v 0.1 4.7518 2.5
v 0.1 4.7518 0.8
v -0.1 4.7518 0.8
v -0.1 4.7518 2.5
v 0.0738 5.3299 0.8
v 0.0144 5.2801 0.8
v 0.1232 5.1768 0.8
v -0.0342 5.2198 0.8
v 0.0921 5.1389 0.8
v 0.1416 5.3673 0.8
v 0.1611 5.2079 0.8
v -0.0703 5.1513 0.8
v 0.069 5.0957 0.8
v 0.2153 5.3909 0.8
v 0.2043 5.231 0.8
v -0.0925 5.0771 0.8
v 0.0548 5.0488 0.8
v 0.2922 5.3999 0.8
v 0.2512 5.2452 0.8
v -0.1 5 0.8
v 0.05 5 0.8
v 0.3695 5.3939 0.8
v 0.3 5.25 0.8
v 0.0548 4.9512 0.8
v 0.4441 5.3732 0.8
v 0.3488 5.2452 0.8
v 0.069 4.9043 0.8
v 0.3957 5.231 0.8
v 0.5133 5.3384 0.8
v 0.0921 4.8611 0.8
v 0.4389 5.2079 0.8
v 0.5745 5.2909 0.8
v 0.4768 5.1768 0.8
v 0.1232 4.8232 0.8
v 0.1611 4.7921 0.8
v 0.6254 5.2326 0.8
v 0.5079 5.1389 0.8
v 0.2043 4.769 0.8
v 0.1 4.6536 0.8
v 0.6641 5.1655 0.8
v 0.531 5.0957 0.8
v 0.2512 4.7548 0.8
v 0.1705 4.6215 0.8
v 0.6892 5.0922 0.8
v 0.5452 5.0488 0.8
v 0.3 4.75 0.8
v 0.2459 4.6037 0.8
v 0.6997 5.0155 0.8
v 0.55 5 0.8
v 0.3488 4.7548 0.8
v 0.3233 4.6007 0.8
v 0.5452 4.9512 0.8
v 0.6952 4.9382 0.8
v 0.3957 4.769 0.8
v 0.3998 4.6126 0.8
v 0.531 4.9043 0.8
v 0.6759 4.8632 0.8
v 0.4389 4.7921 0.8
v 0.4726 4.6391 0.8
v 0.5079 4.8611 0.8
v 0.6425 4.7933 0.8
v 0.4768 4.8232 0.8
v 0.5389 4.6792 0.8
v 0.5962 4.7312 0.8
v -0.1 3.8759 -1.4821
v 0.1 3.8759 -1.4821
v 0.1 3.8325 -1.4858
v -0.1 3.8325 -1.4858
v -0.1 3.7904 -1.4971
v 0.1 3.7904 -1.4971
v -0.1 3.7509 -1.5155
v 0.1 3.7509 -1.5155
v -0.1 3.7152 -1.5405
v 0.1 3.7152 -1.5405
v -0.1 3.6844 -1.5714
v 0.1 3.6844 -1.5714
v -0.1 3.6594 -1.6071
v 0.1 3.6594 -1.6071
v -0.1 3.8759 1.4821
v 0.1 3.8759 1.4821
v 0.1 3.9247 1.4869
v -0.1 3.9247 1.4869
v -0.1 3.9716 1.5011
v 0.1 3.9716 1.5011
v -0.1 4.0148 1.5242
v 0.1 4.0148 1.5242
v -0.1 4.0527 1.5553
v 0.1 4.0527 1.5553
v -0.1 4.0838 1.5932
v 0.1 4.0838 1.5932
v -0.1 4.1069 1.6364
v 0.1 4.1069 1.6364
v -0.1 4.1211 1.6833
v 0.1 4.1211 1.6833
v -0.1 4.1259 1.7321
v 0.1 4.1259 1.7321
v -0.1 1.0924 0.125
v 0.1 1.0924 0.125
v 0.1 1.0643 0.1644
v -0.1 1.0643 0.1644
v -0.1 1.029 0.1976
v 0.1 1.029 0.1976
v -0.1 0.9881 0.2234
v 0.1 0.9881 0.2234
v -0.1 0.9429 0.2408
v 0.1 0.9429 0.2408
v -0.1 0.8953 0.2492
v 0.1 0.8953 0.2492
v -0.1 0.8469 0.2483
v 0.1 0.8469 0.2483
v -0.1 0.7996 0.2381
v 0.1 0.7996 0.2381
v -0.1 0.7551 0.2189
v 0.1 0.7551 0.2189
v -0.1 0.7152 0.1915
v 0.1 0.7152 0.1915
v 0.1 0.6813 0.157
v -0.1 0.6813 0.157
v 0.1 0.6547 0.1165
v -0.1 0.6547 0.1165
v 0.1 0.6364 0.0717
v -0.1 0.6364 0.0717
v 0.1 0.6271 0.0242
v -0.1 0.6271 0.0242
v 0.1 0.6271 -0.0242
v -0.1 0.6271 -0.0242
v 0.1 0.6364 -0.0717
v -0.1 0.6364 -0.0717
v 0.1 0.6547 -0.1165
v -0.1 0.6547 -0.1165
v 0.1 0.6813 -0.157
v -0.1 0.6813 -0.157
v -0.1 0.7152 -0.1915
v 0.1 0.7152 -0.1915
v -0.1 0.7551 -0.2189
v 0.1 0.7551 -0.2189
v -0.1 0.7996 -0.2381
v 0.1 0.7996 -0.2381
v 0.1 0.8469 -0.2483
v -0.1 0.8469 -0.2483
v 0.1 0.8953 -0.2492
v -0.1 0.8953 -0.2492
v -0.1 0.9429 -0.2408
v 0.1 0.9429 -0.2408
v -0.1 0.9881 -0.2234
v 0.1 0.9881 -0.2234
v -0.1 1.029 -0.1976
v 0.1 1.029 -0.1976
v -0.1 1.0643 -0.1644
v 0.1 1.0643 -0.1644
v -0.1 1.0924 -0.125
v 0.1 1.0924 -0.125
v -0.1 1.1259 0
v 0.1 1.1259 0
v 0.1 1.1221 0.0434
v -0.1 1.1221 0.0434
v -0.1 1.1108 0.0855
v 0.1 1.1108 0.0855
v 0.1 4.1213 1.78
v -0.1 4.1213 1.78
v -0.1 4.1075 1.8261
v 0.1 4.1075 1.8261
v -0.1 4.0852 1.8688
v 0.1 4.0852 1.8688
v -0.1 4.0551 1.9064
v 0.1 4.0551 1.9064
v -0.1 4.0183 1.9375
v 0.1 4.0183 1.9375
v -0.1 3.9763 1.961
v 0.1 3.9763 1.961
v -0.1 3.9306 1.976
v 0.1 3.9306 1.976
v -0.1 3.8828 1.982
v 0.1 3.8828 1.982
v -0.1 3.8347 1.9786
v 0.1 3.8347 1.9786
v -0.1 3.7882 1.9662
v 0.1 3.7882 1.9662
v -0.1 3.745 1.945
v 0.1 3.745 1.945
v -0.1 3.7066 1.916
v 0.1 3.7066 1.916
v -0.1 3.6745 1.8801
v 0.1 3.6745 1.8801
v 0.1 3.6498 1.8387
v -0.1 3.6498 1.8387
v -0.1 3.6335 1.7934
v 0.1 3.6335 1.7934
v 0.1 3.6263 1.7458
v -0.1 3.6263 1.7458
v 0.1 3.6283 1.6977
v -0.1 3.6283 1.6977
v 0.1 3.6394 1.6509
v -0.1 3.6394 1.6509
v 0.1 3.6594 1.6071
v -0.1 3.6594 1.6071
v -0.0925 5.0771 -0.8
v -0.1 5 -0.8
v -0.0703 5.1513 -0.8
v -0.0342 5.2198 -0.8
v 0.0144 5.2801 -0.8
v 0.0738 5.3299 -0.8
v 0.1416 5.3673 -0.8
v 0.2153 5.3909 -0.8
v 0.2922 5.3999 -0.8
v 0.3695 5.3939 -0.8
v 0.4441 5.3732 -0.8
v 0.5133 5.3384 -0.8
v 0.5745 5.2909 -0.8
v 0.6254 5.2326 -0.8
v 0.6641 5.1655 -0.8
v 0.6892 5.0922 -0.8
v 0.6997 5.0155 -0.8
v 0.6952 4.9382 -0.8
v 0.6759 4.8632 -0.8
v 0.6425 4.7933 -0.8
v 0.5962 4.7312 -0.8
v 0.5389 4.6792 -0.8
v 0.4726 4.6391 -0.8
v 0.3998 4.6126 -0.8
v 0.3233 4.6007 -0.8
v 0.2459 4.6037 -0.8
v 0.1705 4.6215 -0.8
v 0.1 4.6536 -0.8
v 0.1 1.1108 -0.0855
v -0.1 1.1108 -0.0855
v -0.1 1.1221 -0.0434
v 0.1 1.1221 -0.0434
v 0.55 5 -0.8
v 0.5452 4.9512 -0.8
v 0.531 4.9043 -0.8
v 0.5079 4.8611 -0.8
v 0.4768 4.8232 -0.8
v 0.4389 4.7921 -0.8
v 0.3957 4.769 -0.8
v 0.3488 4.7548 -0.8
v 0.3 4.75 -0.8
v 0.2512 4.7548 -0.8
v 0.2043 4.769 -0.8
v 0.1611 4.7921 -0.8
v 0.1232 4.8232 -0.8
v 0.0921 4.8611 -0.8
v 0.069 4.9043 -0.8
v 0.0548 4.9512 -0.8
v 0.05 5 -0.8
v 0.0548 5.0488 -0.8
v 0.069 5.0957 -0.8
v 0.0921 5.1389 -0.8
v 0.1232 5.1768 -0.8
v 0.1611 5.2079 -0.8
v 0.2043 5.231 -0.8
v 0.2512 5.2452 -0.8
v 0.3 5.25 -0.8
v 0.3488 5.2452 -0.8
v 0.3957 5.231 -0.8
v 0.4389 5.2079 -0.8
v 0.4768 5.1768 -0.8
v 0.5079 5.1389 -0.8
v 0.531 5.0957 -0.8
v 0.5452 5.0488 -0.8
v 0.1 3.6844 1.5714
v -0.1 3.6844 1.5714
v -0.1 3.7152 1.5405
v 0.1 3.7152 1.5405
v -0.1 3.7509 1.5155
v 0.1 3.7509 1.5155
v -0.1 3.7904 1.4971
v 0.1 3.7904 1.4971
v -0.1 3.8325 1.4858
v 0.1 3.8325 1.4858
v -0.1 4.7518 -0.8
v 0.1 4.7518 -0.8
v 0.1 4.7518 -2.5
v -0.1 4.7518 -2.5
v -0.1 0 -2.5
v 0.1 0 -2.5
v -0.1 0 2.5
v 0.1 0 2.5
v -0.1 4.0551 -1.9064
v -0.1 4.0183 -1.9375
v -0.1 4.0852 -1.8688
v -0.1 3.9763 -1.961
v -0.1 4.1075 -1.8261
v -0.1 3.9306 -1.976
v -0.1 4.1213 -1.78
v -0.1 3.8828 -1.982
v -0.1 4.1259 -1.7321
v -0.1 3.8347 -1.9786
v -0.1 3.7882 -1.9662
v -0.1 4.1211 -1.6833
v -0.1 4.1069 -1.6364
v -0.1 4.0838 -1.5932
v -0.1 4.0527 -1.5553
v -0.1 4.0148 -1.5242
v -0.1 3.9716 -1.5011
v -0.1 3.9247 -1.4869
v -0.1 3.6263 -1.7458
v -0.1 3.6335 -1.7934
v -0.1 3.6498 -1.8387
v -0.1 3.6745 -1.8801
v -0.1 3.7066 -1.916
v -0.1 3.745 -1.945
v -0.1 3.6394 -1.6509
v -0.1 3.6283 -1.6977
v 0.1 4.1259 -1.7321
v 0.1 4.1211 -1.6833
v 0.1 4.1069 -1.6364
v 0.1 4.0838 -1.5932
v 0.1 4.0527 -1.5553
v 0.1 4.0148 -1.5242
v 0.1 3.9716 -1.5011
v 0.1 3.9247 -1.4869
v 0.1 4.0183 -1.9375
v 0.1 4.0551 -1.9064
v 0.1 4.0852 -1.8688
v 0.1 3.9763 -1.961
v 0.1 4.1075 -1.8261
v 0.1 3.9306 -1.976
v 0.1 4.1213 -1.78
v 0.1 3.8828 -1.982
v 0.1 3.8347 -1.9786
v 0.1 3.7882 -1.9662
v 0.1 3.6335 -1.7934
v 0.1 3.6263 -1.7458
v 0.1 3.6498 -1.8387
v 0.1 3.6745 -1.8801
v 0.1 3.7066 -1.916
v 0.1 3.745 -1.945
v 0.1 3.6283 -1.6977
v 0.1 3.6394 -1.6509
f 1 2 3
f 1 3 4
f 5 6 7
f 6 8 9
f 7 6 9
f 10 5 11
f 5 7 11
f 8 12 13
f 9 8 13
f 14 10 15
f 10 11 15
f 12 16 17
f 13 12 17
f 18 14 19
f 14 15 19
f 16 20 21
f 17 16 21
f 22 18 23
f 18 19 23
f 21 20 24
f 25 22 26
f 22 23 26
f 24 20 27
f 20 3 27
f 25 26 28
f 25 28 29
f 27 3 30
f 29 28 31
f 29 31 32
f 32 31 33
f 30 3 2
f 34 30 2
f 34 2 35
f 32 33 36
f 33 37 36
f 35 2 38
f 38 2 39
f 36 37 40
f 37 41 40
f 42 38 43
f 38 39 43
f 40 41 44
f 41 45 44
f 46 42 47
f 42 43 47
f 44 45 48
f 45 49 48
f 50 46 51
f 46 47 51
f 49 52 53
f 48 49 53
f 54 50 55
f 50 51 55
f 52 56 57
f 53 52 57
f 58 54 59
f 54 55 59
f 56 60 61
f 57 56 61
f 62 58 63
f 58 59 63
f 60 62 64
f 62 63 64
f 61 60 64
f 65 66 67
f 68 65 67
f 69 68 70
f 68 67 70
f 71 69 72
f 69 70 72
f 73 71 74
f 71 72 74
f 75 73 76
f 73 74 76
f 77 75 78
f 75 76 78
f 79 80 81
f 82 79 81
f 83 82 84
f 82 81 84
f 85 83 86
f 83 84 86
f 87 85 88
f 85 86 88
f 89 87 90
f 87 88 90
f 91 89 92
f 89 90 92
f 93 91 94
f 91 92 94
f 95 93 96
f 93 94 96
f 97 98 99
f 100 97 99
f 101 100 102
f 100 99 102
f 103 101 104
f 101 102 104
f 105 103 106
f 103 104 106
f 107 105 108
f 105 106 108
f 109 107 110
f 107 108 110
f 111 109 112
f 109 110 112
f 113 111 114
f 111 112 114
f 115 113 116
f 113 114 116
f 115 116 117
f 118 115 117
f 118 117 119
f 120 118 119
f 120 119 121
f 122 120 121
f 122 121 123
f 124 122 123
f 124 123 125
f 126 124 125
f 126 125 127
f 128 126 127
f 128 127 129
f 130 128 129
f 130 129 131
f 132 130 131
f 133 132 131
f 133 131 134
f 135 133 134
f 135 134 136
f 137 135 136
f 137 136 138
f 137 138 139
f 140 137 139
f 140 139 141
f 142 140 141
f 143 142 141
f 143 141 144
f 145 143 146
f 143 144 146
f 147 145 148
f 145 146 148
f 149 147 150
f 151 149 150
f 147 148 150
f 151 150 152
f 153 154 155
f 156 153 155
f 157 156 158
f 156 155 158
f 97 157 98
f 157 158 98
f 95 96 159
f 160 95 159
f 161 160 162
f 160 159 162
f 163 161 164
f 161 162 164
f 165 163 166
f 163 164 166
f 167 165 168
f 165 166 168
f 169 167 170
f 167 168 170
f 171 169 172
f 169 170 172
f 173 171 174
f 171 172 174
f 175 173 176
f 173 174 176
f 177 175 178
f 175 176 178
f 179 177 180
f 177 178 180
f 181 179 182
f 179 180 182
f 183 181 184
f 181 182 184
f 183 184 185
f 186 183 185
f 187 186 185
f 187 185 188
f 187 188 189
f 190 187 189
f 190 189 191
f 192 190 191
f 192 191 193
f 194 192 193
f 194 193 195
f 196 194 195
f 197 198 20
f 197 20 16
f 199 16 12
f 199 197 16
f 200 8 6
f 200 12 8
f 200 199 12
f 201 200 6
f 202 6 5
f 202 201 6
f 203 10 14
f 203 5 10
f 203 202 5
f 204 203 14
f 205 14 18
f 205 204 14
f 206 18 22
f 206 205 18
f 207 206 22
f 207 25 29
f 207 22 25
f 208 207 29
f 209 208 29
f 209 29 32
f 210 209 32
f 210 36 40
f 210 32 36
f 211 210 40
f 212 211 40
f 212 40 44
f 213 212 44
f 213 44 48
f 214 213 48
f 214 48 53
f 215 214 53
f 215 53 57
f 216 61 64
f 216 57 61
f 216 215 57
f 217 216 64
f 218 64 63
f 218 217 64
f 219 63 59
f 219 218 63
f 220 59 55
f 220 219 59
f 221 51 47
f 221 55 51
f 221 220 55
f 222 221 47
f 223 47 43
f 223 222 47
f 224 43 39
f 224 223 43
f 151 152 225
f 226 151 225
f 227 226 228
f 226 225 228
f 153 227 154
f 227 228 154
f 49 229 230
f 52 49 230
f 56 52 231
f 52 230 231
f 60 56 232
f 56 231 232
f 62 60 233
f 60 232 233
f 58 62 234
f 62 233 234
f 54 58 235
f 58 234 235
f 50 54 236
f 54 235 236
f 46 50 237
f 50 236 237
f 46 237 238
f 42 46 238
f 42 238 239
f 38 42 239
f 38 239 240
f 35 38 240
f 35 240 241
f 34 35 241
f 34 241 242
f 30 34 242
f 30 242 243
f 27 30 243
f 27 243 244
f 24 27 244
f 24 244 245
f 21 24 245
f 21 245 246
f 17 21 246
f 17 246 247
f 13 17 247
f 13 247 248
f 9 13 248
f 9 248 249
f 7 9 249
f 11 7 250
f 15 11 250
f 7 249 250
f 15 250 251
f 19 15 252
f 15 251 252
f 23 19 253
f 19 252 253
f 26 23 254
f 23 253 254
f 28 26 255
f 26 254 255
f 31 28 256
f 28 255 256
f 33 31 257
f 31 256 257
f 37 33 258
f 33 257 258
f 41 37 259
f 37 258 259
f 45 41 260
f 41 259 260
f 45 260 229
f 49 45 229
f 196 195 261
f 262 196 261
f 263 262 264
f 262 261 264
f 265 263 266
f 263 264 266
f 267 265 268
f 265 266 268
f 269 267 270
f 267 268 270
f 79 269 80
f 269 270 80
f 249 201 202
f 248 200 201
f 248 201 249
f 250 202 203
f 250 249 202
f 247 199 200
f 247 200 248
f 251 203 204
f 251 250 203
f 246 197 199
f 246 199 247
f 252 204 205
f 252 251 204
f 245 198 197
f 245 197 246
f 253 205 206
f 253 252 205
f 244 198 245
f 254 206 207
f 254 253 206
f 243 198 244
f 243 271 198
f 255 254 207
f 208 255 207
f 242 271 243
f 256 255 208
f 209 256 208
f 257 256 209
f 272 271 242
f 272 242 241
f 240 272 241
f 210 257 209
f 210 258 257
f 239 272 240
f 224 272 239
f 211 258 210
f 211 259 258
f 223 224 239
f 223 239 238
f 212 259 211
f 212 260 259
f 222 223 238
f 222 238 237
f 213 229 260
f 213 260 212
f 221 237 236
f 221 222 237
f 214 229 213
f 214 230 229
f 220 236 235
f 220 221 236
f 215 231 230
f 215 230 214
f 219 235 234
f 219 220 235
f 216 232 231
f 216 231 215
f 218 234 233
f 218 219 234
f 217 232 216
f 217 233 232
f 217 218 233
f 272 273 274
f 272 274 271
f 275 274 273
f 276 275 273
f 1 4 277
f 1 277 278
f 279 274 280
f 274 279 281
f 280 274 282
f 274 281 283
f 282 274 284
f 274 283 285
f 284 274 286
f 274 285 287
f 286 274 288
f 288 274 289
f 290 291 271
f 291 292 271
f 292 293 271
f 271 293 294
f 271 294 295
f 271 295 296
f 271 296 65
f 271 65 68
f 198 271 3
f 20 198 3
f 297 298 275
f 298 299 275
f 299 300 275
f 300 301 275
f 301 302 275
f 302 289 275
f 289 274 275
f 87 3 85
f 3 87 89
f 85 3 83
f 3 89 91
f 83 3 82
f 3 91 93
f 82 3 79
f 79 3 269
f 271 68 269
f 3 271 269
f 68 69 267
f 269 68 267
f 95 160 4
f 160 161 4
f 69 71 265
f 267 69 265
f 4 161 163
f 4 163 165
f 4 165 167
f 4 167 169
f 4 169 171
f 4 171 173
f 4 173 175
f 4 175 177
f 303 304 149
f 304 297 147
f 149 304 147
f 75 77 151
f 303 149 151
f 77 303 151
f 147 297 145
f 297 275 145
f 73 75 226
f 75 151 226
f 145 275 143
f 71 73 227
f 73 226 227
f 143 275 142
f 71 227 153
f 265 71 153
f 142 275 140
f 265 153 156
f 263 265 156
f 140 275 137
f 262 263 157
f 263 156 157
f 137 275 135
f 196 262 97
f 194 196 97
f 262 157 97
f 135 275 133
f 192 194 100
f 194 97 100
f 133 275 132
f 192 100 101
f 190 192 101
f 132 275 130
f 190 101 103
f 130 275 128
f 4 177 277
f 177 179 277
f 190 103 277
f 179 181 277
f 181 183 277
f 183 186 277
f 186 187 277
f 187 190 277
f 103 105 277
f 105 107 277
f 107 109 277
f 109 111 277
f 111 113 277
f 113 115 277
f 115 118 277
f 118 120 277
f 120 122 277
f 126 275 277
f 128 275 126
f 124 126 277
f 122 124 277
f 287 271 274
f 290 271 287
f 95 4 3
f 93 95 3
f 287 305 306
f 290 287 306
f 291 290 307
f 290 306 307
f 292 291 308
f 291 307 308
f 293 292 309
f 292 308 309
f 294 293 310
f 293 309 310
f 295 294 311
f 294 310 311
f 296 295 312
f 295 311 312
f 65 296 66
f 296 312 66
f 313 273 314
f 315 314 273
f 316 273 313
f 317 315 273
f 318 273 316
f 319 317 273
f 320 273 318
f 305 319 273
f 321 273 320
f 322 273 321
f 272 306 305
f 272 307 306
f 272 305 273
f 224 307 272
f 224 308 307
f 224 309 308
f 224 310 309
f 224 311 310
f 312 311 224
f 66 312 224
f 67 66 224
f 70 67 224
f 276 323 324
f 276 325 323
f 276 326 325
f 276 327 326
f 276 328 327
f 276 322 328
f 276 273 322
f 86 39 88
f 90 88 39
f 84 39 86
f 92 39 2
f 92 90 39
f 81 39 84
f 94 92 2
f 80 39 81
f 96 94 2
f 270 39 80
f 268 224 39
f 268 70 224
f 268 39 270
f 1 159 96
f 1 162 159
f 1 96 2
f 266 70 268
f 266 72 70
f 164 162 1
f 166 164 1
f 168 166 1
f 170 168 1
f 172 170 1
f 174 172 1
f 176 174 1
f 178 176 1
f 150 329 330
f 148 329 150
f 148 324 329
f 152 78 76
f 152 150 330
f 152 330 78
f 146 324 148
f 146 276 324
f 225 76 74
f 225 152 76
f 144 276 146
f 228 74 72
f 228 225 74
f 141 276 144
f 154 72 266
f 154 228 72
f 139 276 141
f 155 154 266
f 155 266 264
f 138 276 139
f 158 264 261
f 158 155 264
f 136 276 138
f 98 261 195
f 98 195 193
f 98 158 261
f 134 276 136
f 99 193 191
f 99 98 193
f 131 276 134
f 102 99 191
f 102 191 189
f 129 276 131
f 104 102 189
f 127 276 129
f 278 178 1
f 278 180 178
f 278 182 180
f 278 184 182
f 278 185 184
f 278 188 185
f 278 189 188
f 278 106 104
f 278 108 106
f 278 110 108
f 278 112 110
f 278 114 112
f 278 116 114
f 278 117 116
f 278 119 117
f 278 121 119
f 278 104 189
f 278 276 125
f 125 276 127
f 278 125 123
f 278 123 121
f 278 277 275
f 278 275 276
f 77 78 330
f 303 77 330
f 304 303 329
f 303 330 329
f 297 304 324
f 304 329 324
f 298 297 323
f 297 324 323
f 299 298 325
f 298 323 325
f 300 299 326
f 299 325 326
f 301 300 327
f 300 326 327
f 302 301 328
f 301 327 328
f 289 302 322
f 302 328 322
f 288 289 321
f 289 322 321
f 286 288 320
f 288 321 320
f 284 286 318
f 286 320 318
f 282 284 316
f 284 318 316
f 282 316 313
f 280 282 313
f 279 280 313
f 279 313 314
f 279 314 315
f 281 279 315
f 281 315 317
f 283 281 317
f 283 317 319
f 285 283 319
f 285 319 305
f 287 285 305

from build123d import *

# Parameters (mm, degrees)
F0_W      = 0.2
F0_H      = 5
F1_DEPTH  = 5
F2_R      = 0.4
F3_DEPTH  = 5
F4_R      = 0.25
F5_DEPTH  = 5.001
F6_W      = 0.8436968248
F6_H      = 1.7
F7_DEPTH  = 5.401
F8_W      = 0.7987116055
F8_H      = 1.7
F9_DEPTH  = 0.201
F11_DEPTH = 0.201


with BuildPart() as f1:
    # F0 (on Front) → F1 (new body)
    with BuildSketch(Plane.XZ):
        Rectangle(F0_W, F0_H)
    extrude(amount=-F1_DEPTH)

    # F2 (on face) → F3 (join)
    with BuildSketch(Plane(origin=(0, 0, -2.5), x_dir=(1, 0, 0), z_dir=(0, 0, -1))):
        with Locations((0.3, -5)):
            Circle(F2_R)
    extrude(amount=-F3_DEPTH)

    # F4 (on face) → F5 (cut, through all)
    with BuildSketch(Plane(origin=(0, 0, -2.5), x_dir=(1, 0, 0), z_dir=(0, 0, -1))):
        with Locations((0.3, -5)):
            Circle(F4_R)
    extrude(amount=-F5_DEPTH, mode=Mode.SUBTRACT)

    # F6 (on face) → F7 (cut, through all)
    with BuildSketch(Plane.XZ):
        with Locations((0.5218484124, 1.65)):
            Rectangle(F6_W, F6_H)
        with Locations((0.5218484124, -1.65)):
            Rectangle(F6_W, F6_H)
    extrude(amount=-F7_DEPTH, mode=Mode.SUBTRACT)

    # F8 (on face) → F9 (cut, through all)
    with BuildSketch(Plane.YZ.offset(0.1)):
        with Locations((5.151150722, 1.65)):
            Rectangle(F8_W, F8_H)
        with Locations((5.151150722, -1.65)):
            Rectangle(F8_W, F8_H)
    extrude(amount=-F9_DEPTH, mode=Mode.SUBTRACT)

    # F10 (on face) → F11 (cut, through all)
    with BuildSketch(Plane.YZ.offset(0.1)):
        with BuildLine():
            Line((3.8758974596, 1.4820508076), (3.8758974596, 1.7320508076))
            Line((3.8758974596, 1.7320508076), (3.6593911087, 1.6070508076))
            ThreePointArc((3.6593911087, 1.6070508076), (3.7508974596, 1.5155444566), (3.8758974596, 1.4820508076))
        make_face()
        with BuildLine():
            Line((3.6593911087, 1.6070508076), (3.8758974596, 1.7320508076))
            Line((3.8758974596, 1.7320508076), (3.8758974596, 1.4820508076))
            ThreePointArc((3.8758974596, 1.4820508076), (4.0526741549, 1.5552741123), (4.1258974596, 1.7320508076))
            ThreePointArc((4.1258974596, 1.7320508076), (3.8111926983, 1.9735322641), (3.6593911087, 1.6070508076))
        make_face()
        with BuildLine():
            Line((3.8758974596, -1.7320508076), (3.8758974596, -1.4820508076))
            ThreePointArc((3.8758974596, -1.4820508076), (3.7508974596, -1.5155444566), (3.6593911087, -1.6070508076))
            Line((3.6593911087, -1.6070508076), (3.8758974596, -1.7320508076))
        make_face()
        with BuildLine():
            ThreePointArc((4.1258974596, -1.7320508076), (4.0526741549, -1.5552741123), (3.8758974596, -1.4820508076))
            Line((3.8758974596, -1.4820508076), (3.8758974596, -1.7320508076))
            Line((3.8758974596, -1.7320508076), (3.6593911087, -1.6070508076))
            ThreePointArc((3.6593911087, -1.6070508076), (3.8111926983, -1.9735322641), (4.1258974596, -1.7320508076))
        make_face()
        with BuildLine():
            Line((0.8758974596, 0), (1.0924038106, 0.125))
            ThreePointArc((1.0924038106, 0.125), (0.6258974596, 0), (1.0924038106, -0.125))
            Line((1.0924038106, -0.125), (0.8758974596, 0))
        make_face()
        with BuildLine():
            ThreePointArc((1.1258974596, 0), (1.1173789162, 0.0647047613), (1.0924038106, 0.125))
            Line((1.0924038106, 0.125), (0.8758974596, 0))
            Line((0.8758974596, 0), (1.0924038106, -0.125))
            ThreePointArc((1.0924038106, -0.125), (1.1173789162, -0.0647047613), (1.1258974596, 0))
        make_face()
    extrude(amount=-F11_DEPTH, mode=Mode.SUBTRACT)


solid = f1.part
